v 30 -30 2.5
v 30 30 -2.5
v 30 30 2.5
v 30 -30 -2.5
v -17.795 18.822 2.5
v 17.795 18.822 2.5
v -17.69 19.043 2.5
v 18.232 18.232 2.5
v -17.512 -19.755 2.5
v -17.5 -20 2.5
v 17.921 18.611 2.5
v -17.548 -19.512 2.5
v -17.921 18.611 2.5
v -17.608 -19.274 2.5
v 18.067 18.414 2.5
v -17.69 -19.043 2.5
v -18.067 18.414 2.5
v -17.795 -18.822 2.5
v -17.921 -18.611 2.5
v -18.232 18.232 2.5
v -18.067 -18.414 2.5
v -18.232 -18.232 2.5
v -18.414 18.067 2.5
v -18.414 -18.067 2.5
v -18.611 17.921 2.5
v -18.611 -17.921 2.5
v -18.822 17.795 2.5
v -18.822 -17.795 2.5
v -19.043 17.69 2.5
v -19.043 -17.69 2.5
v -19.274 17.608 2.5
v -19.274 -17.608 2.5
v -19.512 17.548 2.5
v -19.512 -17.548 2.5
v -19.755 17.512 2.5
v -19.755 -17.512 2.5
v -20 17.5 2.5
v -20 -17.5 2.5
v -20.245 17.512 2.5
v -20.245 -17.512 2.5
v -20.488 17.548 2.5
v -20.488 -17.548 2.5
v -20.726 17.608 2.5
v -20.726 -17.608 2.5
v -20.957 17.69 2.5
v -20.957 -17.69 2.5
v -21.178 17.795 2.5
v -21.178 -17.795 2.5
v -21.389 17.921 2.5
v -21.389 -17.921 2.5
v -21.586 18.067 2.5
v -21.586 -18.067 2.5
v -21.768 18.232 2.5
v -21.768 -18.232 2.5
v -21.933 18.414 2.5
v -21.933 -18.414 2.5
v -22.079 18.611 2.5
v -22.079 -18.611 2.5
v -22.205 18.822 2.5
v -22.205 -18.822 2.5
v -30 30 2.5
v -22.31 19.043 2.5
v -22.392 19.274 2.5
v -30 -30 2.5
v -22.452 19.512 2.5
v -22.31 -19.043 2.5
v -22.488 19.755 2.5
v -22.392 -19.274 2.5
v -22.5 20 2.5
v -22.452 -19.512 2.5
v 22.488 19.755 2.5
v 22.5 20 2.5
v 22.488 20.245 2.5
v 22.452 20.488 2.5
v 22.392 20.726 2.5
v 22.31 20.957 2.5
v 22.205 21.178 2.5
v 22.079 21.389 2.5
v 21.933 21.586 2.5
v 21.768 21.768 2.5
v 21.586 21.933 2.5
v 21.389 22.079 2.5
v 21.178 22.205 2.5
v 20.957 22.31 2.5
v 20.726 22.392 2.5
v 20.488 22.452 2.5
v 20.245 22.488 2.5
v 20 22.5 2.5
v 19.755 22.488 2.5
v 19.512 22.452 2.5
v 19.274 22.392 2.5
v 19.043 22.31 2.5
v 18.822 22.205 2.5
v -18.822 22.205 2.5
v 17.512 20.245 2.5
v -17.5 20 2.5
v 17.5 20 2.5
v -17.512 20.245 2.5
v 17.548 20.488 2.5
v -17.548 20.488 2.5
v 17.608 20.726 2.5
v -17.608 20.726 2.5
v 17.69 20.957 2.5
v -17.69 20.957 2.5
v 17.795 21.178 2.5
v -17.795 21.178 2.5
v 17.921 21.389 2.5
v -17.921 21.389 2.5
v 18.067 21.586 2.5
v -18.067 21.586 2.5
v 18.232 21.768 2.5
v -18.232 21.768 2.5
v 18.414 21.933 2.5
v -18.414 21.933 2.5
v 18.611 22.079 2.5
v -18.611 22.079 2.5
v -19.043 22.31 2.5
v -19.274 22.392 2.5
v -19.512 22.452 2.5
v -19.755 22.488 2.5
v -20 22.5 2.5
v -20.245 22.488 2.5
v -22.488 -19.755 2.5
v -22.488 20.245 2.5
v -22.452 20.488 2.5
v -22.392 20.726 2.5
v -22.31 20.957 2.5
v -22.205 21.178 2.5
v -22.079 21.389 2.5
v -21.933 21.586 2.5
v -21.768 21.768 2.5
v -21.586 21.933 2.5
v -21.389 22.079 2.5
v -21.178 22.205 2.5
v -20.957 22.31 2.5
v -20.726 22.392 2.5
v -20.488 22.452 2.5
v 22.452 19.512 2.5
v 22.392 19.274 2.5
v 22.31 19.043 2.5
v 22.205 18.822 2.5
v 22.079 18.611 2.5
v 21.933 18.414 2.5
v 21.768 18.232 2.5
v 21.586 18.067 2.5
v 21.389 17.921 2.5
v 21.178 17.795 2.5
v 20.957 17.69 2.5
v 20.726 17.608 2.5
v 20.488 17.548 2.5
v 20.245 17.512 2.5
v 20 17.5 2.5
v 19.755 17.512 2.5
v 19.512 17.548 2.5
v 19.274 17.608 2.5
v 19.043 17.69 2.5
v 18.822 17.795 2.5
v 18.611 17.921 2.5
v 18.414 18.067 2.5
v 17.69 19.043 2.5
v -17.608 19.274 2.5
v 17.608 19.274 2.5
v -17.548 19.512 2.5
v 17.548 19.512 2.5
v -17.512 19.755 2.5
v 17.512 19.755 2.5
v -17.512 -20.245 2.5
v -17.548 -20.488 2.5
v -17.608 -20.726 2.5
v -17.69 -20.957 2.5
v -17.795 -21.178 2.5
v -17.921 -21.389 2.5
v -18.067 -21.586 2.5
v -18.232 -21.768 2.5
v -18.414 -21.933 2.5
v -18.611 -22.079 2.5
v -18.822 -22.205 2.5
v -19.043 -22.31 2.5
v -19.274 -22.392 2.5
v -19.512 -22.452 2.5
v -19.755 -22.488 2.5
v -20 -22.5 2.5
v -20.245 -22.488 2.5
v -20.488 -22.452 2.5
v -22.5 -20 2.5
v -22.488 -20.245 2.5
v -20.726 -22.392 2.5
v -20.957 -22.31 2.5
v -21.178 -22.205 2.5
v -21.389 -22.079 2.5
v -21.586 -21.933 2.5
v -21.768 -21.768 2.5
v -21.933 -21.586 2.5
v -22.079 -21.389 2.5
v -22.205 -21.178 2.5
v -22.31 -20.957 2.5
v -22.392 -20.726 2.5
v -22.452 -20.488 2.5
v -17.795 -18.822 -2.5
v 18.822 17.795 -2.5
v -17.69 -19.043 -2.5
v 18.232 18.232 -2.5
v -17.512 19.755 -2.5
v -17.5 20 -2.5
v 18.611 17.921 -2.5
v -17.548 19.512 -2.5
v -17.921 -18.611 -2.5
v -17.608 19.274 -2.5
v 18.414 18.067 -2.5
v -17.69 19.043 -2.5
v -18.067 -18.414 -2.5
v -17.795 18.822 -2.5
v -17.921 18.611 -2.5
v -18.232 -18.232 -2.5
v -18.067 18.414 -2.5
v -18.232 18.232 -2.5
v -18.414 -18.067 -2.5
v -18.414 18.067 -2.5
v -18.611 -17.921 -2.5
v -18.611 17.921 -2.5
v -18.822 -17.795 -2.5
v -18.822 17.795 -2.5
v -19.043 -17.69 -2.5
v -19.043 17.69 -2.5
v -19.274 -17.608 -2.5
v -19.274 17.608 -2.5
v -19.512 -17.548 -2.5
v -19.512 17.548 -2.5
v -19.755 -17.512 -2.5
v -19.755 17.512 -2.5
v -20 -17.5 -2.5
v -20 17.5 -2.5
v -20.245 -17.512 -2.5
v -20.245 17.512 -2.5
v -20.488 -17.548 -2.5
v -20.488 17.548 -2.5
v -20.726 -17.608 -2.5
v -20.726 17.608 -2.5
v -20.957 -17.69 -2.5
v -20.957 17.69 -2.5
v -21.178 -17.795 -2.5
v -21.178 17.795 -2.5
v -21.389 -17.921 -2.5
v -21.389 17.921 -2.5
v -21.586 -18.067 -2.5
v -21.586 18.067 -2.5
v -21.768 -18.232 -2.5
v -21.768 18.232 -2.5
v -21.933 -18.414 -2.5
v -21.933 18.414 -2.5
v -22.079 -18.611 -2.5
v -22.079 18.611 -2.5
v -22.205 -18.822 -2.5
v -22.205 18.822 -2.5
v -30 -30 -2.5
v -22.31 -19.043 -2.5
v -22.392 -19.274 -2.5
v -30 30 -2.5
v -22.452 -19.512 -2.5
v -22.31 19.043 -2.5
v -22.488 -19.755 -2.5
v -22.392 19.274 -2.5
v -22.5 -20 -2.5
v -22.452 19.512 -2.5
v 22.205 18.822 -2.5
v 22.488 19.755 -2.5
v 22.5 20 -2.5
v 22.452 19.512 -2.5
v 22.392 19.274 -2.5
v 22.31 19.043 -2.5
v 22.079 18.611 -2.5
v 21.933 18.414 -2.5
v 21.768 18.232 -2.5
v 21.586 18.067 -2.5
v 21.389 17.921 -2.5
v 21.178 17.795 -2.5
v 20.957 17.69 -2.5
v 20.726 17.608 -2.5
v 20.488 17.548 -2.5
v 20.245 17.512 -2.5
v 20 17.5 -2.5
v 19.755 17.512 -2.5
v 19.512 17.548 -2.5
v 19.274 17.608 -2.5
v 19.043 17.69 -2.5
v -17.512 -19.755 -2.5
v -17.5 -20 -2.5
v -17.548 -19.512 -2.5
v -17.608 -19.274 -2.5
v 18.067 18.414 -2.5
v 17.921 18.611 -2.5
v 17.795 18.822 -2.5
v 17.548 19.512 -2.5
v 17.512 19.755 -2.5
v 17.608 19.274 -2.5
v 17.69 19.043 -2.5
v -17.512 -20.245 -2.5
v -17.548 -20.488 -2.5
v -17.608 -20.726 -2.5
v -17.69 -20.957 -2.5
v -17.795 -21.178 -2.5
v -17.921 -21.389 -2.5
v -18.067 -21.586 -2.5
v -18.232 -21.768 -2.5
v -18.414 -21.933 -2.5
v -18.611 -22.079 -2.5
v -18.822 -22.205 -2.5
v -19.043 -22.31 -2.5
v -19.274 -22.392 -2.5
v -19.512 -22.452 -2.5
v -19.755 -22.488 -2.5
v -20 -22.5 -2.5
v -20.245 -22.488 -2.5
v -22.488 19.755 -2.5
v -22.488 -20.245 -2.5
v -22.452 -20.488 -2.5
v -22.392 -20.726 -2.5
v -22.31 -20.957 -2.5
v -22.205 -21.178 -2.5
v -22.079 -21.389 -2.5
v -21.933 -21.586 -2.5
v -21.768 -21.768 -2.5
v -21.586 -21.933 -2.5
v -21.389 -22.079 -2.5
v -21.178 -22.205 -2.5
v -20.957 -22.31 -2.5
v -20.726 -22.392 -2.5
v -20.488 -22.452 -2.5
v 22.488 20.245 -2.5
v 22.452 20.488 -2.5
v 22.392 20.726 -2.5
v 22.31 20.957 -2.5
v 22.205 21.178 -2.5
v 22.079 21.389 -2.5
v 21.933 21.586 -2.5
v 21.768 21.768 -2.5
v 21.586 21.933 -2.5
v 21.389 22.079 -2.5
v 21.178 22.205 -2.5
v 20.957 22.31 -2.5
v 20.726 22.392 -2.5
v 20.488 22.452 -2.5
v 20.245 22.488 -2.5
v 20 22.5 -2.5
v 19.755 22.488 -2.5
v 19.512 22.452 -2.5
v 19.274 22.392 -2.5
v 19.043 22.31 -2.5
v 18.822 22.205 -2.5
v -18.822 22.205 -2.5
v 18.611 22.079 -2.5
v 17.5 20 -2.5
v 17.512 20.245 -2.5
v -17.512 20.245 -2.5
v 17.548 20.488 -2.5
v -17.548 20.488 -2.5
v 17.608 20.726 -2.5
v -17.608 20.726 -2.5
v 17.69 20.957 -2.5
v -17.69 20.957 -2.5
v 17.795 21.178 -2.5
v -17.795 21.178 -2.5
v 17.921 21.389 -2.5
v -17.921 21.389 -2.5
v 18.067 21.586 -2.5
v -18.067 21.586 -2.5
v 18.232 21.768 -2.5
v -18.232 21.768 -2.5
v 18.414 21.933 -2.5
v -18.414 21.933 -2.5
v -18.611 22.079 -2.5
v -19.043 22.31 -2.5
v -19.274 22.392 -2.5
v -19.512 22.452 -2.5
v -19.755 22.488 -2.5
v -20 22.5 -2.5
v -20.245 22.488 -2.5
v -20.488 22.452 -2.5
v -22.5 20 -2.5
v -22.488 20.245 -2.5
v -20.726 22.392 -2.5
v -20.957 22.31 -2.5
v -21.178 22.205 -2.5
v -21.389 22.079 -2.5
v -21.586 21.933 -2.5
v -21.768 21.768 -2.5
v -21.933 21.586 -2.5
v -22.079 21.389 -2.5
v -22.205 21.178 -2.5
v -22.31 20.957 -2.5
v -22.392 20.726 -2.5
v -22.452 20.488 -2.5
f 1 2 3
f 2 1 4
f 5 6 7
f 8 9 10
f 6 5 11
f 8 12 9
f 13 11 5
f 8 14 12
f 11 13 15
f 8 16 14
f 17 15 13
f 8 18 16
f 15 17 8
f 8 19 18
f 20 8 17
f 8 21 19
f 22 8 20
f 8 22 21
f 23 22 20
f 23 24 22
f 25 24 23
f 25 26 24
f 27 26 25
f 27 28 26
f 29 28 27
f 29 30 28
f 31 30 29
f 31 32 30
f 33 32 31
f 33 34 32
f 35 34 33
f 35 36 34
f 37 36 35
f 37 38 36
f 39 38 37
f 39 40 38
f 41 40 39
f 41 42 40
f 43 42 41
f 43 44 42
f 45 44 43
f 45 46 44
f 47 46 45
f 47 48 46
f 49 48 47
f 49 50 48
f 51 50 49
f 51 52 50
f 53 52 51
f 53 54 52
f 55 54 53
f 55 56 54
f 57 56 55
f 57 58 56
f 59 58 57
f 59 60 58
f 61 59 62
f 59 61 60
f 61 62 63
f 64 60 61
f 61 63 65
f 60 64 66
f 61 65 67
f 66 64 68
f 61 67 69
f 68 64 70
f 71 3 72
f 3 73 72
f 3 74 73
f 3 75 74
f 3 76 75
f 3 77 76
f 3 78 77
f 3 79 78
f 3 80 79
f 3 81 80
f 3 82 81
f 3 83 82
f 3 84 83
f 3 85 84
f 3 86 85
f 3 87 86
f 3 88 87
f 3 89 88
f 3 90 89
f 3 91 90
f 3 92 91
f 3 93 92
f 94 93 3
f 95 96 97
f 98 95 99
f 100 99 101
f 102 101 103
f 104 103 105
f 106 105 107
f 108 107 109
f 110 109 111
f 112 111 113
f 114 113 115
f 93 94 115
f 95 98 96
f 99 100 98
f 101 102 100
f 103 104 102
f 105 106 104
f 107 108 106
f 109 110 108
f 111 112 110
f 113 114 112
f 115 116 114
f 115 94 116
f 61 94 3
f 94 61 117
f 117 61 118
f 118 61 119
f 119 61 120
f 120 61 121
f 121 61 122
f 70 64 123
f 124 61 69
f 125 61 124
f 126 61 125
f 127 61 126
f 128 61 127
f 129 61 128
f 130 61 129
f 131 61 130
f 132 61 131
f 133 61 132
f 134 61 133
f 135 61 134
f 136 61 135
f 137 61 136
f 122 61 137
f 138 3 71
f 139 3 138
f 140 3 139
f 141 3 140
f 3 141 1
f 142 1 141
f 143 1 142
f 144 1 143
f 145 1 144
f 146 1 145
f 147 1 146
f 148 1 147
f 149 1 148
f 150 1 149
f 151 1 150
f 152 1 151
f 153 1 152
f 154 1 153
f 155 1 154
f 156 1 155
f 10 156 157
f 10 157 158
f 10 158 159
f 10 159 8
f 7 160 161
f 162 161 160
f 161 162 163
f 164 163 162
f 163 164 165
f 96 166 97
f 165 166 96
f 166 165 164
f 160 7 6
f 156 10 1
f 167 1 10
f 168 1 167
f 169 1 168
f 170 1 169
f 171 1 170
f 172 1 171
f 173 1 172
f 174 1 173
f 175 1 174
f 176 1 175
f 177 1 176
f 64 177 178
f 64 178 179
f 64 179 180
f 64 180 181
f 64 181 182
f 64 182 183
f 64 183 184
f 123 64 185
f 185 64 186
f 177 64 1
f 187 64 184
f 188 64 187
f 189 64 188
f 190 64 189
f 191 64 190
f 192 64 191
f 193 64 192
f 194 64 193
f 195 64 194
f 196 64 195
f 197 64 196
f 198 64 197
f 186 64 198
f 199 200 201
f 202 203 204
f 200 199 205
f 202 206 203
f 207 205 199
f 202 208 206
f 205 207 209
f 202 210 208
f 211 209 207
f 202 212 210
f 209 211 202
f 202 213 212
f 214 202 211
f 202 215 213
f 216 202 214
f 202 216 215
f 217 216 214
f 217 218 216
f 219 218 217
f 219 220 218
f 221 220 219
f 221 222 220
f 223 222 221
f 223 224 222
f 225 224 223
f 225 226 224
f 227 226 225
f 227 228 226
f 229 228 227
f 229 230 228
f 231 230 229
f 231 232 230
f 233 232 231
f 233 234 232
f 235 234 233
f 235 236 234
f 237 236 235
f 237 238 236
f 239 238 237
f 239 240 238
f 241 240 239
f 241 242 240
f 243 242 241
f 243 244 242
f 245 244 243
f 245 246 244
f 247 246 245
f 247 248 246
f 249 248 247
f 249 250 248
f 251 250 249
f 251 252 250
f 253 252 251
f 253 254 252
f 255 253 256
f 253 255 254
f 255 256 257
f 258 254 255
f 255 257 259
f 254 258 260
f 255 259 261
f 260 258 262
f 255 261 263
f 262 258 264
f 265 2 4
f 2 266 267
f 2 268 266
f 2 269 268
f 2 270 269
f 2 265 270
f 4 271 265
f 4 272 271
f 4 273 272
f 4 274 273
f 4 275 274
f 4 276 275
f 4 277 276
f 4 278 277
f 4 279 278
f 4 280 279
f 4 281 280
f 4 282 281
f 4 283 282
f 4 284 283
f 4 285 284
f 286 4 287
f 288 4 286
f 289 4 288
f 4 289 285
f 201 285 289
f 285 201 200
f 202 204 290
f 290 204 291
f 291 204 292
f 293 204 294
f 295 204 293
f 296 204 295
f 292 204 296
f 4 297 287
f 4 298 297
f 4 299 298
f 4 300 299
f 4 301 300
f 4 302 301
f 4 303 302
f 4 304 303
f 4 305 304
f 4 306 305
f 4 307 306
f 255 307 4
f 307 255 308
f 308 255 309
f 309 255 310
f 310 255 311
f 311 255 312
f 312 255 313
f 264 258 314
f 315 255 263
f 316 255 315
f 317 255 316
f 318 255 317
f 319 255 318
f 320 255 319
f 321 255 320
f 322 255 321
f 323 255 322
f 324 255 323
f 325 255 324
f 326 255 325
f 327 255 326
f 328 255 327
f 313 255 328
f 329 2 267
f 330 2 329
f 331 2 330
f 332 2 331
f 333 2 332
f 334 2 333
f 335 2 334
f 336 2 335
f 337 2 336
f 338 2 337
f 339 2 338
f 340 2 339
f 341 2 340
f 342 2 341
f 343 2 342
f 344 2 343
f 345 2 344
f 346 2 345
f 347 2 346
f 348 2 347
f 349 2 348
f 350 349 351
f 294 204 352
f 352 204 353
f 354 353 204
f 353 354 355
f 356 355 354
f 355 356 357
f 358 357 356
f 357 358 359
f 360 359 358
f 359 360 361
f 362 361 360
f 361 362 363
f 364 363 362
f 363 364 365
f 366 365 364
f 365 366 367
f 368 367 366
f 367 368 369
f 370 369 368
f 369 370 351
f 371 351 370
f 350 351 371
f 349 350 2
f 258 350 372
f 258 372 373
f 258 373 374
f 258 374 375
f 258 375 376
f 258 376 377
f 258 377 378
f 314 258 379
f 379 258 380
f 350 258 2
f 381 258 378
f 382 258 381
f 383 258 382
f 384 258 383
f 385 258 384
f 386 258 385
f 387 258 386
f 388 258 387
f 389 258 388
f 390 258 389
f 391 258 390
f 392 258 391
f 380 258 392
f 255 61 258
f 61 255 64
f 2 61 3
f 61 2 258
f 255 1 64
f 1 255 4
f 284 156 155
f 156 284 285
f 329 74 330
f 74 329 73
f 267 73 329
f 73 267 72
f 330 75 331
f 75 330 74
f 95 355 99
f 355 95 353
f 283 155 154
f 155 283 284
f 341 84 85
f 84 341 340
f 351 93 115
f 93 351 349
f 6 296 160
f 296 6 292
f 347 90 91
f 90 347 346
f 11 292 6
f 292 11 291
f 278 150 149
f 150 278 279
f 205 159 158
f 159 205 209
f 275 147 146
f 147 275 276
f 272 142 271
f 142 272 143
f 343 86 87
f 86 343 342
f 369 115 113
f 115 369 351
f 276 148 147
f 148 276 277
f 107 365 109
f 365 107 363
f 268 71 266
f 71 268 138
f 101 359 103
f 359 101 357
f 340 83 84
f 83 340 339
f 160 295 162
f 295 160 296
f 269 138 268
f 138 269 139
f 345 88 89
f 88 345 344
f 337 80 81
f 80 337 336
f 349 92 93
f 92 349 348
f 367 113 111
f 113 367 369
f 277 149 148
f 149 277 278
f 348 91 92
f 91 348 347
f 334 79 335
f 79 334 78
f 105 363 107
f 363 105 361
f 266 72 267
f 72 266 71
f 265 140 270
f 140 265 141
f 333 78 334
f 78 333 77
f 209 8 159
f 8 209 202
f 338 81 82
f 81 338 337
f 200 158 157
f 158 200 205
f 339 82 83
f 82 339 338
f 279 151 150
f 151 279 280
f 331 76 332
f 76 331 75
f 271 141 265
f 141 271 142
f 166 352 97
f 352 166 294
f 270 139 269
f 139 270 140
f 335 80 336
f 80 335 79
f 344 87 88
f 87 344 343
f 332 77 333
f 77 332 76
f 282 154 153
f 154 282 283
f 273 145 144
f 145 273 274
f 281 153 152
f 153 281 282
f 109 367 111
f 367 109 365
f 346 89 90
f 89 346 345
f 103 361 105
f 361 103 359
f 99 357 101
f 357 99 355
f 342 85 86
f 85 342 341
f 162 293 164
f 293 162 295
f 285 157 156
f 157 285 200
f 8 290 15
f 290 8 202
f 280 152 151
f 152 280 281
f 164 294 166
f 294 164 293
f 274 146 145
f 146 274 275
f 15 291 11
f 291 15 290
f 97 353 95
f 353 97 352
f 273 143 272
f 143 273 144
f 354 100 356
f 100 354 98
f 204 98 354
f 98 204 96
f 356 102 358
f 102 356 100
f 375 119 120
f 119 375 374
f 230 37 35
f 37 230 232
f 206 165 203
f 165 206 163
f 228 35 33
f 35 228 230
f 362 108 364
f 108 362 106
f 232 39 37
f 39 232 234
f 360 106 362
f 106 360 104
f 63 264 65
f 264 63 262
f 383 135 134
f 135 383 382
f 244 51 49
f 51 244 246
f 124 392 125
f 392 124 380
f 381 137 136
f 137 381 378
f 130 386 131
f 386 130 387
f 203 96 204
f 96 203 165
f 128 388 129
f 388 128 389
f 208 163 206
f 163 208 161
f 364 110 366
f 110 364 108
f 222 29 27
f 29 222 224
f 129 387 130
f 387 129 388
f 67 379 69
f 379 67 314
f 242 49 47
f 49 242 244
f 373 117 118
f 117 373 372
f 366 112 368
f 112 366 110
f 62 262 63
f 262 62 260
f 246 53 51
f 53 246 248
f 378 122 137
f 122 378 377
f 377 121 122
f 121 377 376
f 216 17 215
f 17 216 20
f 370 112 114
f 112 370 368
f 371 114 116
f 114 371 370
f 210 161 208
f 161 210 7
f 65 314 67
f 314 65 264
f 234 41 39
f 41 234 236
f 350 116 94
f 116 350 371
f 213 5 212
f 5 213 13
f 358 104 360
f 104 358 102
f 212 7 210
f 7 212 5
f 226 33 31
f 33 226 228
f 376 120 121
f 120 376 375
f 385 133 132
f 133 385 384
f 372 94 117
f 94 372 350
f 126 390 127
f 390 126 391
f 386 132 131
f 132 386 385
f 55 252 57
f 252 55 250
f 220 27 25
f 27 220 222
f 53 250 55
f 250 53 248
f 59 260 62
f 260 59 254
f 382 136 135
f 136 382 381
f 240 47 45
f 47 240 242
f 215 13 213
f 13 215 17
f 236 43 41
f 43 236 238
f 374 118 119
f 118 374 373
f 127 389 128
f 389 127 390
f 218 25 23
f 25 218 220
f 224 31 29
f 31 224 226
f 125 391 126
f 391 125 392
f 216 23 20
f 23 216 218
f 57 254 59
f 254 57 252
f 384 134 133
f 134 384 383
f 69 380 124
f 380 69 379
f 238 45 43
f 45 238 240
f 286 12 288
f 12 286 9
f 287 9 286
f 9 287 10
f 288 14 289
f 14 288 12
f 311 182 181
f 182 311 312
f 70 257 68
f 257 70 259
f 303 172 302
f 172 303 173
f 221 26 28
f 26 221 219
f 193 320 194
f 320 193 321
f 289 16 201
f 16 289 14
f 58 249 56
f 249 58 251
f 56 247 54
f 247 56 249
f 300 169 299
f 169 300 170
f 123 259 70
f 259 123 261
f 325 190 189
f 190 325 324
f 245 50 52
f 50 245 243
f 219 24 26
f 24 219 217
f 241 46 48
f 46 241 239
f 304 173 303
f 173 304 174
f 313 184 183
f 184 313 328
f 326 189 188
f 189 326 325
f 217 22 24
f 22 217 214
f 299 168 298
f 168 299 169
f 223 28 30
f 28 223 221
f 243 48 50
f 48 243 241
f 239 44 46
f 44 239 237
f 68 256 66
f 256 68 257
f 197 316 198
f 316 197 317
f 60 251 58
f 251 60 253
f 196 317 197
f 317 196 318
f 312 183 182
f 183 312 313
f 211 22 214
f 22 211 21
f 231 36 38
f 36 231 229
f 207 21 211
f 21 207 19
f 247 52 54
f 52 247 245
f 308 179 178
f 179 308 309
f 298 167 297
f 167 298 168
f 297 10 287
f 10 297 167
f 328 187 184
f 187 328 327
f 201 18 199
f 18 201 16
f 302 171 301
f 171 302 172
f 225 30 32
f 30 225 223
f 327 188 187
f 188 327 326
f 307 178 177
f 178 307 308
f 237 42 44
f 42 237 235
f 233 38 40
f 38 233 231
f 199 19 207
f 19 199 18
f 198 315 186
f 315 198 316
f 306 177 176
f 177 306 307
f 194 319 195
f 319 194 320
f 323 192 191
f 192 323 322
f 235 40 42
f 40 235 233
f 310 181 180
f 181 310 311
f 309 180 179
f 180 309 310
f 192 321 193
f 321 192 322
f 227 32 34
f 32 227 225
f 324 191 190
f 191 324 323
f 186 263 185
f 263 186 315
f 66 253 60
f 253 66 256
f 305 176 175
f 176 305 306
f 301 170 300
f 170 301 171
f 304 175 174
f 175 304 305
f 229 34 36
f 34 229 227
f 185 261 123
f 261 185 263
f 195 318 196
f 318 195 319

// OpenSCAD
// A plate with a four-hole bolt pattern on a 40 mm square.

plate_x = 60;
plate_y = 60;
plate_z = 5;
hole_d  = 5;
pitch   = 40;
$fn = 64;

h = pitch / 2;

difference() {
    cube([plate_x, plate_y, plate_z], center = true);
    translate([ h,  h, 0]) cylinder(h = plate_z + 2, d = hole_d, center = true);
    translate([-h,  h, 0]) cylinder(h = plate_z + 2, d = hole_d, center = true);
    translate([-h, -h, 0]) cylinder(h = plate_z + 2, d = hole_d, center = true);
}
